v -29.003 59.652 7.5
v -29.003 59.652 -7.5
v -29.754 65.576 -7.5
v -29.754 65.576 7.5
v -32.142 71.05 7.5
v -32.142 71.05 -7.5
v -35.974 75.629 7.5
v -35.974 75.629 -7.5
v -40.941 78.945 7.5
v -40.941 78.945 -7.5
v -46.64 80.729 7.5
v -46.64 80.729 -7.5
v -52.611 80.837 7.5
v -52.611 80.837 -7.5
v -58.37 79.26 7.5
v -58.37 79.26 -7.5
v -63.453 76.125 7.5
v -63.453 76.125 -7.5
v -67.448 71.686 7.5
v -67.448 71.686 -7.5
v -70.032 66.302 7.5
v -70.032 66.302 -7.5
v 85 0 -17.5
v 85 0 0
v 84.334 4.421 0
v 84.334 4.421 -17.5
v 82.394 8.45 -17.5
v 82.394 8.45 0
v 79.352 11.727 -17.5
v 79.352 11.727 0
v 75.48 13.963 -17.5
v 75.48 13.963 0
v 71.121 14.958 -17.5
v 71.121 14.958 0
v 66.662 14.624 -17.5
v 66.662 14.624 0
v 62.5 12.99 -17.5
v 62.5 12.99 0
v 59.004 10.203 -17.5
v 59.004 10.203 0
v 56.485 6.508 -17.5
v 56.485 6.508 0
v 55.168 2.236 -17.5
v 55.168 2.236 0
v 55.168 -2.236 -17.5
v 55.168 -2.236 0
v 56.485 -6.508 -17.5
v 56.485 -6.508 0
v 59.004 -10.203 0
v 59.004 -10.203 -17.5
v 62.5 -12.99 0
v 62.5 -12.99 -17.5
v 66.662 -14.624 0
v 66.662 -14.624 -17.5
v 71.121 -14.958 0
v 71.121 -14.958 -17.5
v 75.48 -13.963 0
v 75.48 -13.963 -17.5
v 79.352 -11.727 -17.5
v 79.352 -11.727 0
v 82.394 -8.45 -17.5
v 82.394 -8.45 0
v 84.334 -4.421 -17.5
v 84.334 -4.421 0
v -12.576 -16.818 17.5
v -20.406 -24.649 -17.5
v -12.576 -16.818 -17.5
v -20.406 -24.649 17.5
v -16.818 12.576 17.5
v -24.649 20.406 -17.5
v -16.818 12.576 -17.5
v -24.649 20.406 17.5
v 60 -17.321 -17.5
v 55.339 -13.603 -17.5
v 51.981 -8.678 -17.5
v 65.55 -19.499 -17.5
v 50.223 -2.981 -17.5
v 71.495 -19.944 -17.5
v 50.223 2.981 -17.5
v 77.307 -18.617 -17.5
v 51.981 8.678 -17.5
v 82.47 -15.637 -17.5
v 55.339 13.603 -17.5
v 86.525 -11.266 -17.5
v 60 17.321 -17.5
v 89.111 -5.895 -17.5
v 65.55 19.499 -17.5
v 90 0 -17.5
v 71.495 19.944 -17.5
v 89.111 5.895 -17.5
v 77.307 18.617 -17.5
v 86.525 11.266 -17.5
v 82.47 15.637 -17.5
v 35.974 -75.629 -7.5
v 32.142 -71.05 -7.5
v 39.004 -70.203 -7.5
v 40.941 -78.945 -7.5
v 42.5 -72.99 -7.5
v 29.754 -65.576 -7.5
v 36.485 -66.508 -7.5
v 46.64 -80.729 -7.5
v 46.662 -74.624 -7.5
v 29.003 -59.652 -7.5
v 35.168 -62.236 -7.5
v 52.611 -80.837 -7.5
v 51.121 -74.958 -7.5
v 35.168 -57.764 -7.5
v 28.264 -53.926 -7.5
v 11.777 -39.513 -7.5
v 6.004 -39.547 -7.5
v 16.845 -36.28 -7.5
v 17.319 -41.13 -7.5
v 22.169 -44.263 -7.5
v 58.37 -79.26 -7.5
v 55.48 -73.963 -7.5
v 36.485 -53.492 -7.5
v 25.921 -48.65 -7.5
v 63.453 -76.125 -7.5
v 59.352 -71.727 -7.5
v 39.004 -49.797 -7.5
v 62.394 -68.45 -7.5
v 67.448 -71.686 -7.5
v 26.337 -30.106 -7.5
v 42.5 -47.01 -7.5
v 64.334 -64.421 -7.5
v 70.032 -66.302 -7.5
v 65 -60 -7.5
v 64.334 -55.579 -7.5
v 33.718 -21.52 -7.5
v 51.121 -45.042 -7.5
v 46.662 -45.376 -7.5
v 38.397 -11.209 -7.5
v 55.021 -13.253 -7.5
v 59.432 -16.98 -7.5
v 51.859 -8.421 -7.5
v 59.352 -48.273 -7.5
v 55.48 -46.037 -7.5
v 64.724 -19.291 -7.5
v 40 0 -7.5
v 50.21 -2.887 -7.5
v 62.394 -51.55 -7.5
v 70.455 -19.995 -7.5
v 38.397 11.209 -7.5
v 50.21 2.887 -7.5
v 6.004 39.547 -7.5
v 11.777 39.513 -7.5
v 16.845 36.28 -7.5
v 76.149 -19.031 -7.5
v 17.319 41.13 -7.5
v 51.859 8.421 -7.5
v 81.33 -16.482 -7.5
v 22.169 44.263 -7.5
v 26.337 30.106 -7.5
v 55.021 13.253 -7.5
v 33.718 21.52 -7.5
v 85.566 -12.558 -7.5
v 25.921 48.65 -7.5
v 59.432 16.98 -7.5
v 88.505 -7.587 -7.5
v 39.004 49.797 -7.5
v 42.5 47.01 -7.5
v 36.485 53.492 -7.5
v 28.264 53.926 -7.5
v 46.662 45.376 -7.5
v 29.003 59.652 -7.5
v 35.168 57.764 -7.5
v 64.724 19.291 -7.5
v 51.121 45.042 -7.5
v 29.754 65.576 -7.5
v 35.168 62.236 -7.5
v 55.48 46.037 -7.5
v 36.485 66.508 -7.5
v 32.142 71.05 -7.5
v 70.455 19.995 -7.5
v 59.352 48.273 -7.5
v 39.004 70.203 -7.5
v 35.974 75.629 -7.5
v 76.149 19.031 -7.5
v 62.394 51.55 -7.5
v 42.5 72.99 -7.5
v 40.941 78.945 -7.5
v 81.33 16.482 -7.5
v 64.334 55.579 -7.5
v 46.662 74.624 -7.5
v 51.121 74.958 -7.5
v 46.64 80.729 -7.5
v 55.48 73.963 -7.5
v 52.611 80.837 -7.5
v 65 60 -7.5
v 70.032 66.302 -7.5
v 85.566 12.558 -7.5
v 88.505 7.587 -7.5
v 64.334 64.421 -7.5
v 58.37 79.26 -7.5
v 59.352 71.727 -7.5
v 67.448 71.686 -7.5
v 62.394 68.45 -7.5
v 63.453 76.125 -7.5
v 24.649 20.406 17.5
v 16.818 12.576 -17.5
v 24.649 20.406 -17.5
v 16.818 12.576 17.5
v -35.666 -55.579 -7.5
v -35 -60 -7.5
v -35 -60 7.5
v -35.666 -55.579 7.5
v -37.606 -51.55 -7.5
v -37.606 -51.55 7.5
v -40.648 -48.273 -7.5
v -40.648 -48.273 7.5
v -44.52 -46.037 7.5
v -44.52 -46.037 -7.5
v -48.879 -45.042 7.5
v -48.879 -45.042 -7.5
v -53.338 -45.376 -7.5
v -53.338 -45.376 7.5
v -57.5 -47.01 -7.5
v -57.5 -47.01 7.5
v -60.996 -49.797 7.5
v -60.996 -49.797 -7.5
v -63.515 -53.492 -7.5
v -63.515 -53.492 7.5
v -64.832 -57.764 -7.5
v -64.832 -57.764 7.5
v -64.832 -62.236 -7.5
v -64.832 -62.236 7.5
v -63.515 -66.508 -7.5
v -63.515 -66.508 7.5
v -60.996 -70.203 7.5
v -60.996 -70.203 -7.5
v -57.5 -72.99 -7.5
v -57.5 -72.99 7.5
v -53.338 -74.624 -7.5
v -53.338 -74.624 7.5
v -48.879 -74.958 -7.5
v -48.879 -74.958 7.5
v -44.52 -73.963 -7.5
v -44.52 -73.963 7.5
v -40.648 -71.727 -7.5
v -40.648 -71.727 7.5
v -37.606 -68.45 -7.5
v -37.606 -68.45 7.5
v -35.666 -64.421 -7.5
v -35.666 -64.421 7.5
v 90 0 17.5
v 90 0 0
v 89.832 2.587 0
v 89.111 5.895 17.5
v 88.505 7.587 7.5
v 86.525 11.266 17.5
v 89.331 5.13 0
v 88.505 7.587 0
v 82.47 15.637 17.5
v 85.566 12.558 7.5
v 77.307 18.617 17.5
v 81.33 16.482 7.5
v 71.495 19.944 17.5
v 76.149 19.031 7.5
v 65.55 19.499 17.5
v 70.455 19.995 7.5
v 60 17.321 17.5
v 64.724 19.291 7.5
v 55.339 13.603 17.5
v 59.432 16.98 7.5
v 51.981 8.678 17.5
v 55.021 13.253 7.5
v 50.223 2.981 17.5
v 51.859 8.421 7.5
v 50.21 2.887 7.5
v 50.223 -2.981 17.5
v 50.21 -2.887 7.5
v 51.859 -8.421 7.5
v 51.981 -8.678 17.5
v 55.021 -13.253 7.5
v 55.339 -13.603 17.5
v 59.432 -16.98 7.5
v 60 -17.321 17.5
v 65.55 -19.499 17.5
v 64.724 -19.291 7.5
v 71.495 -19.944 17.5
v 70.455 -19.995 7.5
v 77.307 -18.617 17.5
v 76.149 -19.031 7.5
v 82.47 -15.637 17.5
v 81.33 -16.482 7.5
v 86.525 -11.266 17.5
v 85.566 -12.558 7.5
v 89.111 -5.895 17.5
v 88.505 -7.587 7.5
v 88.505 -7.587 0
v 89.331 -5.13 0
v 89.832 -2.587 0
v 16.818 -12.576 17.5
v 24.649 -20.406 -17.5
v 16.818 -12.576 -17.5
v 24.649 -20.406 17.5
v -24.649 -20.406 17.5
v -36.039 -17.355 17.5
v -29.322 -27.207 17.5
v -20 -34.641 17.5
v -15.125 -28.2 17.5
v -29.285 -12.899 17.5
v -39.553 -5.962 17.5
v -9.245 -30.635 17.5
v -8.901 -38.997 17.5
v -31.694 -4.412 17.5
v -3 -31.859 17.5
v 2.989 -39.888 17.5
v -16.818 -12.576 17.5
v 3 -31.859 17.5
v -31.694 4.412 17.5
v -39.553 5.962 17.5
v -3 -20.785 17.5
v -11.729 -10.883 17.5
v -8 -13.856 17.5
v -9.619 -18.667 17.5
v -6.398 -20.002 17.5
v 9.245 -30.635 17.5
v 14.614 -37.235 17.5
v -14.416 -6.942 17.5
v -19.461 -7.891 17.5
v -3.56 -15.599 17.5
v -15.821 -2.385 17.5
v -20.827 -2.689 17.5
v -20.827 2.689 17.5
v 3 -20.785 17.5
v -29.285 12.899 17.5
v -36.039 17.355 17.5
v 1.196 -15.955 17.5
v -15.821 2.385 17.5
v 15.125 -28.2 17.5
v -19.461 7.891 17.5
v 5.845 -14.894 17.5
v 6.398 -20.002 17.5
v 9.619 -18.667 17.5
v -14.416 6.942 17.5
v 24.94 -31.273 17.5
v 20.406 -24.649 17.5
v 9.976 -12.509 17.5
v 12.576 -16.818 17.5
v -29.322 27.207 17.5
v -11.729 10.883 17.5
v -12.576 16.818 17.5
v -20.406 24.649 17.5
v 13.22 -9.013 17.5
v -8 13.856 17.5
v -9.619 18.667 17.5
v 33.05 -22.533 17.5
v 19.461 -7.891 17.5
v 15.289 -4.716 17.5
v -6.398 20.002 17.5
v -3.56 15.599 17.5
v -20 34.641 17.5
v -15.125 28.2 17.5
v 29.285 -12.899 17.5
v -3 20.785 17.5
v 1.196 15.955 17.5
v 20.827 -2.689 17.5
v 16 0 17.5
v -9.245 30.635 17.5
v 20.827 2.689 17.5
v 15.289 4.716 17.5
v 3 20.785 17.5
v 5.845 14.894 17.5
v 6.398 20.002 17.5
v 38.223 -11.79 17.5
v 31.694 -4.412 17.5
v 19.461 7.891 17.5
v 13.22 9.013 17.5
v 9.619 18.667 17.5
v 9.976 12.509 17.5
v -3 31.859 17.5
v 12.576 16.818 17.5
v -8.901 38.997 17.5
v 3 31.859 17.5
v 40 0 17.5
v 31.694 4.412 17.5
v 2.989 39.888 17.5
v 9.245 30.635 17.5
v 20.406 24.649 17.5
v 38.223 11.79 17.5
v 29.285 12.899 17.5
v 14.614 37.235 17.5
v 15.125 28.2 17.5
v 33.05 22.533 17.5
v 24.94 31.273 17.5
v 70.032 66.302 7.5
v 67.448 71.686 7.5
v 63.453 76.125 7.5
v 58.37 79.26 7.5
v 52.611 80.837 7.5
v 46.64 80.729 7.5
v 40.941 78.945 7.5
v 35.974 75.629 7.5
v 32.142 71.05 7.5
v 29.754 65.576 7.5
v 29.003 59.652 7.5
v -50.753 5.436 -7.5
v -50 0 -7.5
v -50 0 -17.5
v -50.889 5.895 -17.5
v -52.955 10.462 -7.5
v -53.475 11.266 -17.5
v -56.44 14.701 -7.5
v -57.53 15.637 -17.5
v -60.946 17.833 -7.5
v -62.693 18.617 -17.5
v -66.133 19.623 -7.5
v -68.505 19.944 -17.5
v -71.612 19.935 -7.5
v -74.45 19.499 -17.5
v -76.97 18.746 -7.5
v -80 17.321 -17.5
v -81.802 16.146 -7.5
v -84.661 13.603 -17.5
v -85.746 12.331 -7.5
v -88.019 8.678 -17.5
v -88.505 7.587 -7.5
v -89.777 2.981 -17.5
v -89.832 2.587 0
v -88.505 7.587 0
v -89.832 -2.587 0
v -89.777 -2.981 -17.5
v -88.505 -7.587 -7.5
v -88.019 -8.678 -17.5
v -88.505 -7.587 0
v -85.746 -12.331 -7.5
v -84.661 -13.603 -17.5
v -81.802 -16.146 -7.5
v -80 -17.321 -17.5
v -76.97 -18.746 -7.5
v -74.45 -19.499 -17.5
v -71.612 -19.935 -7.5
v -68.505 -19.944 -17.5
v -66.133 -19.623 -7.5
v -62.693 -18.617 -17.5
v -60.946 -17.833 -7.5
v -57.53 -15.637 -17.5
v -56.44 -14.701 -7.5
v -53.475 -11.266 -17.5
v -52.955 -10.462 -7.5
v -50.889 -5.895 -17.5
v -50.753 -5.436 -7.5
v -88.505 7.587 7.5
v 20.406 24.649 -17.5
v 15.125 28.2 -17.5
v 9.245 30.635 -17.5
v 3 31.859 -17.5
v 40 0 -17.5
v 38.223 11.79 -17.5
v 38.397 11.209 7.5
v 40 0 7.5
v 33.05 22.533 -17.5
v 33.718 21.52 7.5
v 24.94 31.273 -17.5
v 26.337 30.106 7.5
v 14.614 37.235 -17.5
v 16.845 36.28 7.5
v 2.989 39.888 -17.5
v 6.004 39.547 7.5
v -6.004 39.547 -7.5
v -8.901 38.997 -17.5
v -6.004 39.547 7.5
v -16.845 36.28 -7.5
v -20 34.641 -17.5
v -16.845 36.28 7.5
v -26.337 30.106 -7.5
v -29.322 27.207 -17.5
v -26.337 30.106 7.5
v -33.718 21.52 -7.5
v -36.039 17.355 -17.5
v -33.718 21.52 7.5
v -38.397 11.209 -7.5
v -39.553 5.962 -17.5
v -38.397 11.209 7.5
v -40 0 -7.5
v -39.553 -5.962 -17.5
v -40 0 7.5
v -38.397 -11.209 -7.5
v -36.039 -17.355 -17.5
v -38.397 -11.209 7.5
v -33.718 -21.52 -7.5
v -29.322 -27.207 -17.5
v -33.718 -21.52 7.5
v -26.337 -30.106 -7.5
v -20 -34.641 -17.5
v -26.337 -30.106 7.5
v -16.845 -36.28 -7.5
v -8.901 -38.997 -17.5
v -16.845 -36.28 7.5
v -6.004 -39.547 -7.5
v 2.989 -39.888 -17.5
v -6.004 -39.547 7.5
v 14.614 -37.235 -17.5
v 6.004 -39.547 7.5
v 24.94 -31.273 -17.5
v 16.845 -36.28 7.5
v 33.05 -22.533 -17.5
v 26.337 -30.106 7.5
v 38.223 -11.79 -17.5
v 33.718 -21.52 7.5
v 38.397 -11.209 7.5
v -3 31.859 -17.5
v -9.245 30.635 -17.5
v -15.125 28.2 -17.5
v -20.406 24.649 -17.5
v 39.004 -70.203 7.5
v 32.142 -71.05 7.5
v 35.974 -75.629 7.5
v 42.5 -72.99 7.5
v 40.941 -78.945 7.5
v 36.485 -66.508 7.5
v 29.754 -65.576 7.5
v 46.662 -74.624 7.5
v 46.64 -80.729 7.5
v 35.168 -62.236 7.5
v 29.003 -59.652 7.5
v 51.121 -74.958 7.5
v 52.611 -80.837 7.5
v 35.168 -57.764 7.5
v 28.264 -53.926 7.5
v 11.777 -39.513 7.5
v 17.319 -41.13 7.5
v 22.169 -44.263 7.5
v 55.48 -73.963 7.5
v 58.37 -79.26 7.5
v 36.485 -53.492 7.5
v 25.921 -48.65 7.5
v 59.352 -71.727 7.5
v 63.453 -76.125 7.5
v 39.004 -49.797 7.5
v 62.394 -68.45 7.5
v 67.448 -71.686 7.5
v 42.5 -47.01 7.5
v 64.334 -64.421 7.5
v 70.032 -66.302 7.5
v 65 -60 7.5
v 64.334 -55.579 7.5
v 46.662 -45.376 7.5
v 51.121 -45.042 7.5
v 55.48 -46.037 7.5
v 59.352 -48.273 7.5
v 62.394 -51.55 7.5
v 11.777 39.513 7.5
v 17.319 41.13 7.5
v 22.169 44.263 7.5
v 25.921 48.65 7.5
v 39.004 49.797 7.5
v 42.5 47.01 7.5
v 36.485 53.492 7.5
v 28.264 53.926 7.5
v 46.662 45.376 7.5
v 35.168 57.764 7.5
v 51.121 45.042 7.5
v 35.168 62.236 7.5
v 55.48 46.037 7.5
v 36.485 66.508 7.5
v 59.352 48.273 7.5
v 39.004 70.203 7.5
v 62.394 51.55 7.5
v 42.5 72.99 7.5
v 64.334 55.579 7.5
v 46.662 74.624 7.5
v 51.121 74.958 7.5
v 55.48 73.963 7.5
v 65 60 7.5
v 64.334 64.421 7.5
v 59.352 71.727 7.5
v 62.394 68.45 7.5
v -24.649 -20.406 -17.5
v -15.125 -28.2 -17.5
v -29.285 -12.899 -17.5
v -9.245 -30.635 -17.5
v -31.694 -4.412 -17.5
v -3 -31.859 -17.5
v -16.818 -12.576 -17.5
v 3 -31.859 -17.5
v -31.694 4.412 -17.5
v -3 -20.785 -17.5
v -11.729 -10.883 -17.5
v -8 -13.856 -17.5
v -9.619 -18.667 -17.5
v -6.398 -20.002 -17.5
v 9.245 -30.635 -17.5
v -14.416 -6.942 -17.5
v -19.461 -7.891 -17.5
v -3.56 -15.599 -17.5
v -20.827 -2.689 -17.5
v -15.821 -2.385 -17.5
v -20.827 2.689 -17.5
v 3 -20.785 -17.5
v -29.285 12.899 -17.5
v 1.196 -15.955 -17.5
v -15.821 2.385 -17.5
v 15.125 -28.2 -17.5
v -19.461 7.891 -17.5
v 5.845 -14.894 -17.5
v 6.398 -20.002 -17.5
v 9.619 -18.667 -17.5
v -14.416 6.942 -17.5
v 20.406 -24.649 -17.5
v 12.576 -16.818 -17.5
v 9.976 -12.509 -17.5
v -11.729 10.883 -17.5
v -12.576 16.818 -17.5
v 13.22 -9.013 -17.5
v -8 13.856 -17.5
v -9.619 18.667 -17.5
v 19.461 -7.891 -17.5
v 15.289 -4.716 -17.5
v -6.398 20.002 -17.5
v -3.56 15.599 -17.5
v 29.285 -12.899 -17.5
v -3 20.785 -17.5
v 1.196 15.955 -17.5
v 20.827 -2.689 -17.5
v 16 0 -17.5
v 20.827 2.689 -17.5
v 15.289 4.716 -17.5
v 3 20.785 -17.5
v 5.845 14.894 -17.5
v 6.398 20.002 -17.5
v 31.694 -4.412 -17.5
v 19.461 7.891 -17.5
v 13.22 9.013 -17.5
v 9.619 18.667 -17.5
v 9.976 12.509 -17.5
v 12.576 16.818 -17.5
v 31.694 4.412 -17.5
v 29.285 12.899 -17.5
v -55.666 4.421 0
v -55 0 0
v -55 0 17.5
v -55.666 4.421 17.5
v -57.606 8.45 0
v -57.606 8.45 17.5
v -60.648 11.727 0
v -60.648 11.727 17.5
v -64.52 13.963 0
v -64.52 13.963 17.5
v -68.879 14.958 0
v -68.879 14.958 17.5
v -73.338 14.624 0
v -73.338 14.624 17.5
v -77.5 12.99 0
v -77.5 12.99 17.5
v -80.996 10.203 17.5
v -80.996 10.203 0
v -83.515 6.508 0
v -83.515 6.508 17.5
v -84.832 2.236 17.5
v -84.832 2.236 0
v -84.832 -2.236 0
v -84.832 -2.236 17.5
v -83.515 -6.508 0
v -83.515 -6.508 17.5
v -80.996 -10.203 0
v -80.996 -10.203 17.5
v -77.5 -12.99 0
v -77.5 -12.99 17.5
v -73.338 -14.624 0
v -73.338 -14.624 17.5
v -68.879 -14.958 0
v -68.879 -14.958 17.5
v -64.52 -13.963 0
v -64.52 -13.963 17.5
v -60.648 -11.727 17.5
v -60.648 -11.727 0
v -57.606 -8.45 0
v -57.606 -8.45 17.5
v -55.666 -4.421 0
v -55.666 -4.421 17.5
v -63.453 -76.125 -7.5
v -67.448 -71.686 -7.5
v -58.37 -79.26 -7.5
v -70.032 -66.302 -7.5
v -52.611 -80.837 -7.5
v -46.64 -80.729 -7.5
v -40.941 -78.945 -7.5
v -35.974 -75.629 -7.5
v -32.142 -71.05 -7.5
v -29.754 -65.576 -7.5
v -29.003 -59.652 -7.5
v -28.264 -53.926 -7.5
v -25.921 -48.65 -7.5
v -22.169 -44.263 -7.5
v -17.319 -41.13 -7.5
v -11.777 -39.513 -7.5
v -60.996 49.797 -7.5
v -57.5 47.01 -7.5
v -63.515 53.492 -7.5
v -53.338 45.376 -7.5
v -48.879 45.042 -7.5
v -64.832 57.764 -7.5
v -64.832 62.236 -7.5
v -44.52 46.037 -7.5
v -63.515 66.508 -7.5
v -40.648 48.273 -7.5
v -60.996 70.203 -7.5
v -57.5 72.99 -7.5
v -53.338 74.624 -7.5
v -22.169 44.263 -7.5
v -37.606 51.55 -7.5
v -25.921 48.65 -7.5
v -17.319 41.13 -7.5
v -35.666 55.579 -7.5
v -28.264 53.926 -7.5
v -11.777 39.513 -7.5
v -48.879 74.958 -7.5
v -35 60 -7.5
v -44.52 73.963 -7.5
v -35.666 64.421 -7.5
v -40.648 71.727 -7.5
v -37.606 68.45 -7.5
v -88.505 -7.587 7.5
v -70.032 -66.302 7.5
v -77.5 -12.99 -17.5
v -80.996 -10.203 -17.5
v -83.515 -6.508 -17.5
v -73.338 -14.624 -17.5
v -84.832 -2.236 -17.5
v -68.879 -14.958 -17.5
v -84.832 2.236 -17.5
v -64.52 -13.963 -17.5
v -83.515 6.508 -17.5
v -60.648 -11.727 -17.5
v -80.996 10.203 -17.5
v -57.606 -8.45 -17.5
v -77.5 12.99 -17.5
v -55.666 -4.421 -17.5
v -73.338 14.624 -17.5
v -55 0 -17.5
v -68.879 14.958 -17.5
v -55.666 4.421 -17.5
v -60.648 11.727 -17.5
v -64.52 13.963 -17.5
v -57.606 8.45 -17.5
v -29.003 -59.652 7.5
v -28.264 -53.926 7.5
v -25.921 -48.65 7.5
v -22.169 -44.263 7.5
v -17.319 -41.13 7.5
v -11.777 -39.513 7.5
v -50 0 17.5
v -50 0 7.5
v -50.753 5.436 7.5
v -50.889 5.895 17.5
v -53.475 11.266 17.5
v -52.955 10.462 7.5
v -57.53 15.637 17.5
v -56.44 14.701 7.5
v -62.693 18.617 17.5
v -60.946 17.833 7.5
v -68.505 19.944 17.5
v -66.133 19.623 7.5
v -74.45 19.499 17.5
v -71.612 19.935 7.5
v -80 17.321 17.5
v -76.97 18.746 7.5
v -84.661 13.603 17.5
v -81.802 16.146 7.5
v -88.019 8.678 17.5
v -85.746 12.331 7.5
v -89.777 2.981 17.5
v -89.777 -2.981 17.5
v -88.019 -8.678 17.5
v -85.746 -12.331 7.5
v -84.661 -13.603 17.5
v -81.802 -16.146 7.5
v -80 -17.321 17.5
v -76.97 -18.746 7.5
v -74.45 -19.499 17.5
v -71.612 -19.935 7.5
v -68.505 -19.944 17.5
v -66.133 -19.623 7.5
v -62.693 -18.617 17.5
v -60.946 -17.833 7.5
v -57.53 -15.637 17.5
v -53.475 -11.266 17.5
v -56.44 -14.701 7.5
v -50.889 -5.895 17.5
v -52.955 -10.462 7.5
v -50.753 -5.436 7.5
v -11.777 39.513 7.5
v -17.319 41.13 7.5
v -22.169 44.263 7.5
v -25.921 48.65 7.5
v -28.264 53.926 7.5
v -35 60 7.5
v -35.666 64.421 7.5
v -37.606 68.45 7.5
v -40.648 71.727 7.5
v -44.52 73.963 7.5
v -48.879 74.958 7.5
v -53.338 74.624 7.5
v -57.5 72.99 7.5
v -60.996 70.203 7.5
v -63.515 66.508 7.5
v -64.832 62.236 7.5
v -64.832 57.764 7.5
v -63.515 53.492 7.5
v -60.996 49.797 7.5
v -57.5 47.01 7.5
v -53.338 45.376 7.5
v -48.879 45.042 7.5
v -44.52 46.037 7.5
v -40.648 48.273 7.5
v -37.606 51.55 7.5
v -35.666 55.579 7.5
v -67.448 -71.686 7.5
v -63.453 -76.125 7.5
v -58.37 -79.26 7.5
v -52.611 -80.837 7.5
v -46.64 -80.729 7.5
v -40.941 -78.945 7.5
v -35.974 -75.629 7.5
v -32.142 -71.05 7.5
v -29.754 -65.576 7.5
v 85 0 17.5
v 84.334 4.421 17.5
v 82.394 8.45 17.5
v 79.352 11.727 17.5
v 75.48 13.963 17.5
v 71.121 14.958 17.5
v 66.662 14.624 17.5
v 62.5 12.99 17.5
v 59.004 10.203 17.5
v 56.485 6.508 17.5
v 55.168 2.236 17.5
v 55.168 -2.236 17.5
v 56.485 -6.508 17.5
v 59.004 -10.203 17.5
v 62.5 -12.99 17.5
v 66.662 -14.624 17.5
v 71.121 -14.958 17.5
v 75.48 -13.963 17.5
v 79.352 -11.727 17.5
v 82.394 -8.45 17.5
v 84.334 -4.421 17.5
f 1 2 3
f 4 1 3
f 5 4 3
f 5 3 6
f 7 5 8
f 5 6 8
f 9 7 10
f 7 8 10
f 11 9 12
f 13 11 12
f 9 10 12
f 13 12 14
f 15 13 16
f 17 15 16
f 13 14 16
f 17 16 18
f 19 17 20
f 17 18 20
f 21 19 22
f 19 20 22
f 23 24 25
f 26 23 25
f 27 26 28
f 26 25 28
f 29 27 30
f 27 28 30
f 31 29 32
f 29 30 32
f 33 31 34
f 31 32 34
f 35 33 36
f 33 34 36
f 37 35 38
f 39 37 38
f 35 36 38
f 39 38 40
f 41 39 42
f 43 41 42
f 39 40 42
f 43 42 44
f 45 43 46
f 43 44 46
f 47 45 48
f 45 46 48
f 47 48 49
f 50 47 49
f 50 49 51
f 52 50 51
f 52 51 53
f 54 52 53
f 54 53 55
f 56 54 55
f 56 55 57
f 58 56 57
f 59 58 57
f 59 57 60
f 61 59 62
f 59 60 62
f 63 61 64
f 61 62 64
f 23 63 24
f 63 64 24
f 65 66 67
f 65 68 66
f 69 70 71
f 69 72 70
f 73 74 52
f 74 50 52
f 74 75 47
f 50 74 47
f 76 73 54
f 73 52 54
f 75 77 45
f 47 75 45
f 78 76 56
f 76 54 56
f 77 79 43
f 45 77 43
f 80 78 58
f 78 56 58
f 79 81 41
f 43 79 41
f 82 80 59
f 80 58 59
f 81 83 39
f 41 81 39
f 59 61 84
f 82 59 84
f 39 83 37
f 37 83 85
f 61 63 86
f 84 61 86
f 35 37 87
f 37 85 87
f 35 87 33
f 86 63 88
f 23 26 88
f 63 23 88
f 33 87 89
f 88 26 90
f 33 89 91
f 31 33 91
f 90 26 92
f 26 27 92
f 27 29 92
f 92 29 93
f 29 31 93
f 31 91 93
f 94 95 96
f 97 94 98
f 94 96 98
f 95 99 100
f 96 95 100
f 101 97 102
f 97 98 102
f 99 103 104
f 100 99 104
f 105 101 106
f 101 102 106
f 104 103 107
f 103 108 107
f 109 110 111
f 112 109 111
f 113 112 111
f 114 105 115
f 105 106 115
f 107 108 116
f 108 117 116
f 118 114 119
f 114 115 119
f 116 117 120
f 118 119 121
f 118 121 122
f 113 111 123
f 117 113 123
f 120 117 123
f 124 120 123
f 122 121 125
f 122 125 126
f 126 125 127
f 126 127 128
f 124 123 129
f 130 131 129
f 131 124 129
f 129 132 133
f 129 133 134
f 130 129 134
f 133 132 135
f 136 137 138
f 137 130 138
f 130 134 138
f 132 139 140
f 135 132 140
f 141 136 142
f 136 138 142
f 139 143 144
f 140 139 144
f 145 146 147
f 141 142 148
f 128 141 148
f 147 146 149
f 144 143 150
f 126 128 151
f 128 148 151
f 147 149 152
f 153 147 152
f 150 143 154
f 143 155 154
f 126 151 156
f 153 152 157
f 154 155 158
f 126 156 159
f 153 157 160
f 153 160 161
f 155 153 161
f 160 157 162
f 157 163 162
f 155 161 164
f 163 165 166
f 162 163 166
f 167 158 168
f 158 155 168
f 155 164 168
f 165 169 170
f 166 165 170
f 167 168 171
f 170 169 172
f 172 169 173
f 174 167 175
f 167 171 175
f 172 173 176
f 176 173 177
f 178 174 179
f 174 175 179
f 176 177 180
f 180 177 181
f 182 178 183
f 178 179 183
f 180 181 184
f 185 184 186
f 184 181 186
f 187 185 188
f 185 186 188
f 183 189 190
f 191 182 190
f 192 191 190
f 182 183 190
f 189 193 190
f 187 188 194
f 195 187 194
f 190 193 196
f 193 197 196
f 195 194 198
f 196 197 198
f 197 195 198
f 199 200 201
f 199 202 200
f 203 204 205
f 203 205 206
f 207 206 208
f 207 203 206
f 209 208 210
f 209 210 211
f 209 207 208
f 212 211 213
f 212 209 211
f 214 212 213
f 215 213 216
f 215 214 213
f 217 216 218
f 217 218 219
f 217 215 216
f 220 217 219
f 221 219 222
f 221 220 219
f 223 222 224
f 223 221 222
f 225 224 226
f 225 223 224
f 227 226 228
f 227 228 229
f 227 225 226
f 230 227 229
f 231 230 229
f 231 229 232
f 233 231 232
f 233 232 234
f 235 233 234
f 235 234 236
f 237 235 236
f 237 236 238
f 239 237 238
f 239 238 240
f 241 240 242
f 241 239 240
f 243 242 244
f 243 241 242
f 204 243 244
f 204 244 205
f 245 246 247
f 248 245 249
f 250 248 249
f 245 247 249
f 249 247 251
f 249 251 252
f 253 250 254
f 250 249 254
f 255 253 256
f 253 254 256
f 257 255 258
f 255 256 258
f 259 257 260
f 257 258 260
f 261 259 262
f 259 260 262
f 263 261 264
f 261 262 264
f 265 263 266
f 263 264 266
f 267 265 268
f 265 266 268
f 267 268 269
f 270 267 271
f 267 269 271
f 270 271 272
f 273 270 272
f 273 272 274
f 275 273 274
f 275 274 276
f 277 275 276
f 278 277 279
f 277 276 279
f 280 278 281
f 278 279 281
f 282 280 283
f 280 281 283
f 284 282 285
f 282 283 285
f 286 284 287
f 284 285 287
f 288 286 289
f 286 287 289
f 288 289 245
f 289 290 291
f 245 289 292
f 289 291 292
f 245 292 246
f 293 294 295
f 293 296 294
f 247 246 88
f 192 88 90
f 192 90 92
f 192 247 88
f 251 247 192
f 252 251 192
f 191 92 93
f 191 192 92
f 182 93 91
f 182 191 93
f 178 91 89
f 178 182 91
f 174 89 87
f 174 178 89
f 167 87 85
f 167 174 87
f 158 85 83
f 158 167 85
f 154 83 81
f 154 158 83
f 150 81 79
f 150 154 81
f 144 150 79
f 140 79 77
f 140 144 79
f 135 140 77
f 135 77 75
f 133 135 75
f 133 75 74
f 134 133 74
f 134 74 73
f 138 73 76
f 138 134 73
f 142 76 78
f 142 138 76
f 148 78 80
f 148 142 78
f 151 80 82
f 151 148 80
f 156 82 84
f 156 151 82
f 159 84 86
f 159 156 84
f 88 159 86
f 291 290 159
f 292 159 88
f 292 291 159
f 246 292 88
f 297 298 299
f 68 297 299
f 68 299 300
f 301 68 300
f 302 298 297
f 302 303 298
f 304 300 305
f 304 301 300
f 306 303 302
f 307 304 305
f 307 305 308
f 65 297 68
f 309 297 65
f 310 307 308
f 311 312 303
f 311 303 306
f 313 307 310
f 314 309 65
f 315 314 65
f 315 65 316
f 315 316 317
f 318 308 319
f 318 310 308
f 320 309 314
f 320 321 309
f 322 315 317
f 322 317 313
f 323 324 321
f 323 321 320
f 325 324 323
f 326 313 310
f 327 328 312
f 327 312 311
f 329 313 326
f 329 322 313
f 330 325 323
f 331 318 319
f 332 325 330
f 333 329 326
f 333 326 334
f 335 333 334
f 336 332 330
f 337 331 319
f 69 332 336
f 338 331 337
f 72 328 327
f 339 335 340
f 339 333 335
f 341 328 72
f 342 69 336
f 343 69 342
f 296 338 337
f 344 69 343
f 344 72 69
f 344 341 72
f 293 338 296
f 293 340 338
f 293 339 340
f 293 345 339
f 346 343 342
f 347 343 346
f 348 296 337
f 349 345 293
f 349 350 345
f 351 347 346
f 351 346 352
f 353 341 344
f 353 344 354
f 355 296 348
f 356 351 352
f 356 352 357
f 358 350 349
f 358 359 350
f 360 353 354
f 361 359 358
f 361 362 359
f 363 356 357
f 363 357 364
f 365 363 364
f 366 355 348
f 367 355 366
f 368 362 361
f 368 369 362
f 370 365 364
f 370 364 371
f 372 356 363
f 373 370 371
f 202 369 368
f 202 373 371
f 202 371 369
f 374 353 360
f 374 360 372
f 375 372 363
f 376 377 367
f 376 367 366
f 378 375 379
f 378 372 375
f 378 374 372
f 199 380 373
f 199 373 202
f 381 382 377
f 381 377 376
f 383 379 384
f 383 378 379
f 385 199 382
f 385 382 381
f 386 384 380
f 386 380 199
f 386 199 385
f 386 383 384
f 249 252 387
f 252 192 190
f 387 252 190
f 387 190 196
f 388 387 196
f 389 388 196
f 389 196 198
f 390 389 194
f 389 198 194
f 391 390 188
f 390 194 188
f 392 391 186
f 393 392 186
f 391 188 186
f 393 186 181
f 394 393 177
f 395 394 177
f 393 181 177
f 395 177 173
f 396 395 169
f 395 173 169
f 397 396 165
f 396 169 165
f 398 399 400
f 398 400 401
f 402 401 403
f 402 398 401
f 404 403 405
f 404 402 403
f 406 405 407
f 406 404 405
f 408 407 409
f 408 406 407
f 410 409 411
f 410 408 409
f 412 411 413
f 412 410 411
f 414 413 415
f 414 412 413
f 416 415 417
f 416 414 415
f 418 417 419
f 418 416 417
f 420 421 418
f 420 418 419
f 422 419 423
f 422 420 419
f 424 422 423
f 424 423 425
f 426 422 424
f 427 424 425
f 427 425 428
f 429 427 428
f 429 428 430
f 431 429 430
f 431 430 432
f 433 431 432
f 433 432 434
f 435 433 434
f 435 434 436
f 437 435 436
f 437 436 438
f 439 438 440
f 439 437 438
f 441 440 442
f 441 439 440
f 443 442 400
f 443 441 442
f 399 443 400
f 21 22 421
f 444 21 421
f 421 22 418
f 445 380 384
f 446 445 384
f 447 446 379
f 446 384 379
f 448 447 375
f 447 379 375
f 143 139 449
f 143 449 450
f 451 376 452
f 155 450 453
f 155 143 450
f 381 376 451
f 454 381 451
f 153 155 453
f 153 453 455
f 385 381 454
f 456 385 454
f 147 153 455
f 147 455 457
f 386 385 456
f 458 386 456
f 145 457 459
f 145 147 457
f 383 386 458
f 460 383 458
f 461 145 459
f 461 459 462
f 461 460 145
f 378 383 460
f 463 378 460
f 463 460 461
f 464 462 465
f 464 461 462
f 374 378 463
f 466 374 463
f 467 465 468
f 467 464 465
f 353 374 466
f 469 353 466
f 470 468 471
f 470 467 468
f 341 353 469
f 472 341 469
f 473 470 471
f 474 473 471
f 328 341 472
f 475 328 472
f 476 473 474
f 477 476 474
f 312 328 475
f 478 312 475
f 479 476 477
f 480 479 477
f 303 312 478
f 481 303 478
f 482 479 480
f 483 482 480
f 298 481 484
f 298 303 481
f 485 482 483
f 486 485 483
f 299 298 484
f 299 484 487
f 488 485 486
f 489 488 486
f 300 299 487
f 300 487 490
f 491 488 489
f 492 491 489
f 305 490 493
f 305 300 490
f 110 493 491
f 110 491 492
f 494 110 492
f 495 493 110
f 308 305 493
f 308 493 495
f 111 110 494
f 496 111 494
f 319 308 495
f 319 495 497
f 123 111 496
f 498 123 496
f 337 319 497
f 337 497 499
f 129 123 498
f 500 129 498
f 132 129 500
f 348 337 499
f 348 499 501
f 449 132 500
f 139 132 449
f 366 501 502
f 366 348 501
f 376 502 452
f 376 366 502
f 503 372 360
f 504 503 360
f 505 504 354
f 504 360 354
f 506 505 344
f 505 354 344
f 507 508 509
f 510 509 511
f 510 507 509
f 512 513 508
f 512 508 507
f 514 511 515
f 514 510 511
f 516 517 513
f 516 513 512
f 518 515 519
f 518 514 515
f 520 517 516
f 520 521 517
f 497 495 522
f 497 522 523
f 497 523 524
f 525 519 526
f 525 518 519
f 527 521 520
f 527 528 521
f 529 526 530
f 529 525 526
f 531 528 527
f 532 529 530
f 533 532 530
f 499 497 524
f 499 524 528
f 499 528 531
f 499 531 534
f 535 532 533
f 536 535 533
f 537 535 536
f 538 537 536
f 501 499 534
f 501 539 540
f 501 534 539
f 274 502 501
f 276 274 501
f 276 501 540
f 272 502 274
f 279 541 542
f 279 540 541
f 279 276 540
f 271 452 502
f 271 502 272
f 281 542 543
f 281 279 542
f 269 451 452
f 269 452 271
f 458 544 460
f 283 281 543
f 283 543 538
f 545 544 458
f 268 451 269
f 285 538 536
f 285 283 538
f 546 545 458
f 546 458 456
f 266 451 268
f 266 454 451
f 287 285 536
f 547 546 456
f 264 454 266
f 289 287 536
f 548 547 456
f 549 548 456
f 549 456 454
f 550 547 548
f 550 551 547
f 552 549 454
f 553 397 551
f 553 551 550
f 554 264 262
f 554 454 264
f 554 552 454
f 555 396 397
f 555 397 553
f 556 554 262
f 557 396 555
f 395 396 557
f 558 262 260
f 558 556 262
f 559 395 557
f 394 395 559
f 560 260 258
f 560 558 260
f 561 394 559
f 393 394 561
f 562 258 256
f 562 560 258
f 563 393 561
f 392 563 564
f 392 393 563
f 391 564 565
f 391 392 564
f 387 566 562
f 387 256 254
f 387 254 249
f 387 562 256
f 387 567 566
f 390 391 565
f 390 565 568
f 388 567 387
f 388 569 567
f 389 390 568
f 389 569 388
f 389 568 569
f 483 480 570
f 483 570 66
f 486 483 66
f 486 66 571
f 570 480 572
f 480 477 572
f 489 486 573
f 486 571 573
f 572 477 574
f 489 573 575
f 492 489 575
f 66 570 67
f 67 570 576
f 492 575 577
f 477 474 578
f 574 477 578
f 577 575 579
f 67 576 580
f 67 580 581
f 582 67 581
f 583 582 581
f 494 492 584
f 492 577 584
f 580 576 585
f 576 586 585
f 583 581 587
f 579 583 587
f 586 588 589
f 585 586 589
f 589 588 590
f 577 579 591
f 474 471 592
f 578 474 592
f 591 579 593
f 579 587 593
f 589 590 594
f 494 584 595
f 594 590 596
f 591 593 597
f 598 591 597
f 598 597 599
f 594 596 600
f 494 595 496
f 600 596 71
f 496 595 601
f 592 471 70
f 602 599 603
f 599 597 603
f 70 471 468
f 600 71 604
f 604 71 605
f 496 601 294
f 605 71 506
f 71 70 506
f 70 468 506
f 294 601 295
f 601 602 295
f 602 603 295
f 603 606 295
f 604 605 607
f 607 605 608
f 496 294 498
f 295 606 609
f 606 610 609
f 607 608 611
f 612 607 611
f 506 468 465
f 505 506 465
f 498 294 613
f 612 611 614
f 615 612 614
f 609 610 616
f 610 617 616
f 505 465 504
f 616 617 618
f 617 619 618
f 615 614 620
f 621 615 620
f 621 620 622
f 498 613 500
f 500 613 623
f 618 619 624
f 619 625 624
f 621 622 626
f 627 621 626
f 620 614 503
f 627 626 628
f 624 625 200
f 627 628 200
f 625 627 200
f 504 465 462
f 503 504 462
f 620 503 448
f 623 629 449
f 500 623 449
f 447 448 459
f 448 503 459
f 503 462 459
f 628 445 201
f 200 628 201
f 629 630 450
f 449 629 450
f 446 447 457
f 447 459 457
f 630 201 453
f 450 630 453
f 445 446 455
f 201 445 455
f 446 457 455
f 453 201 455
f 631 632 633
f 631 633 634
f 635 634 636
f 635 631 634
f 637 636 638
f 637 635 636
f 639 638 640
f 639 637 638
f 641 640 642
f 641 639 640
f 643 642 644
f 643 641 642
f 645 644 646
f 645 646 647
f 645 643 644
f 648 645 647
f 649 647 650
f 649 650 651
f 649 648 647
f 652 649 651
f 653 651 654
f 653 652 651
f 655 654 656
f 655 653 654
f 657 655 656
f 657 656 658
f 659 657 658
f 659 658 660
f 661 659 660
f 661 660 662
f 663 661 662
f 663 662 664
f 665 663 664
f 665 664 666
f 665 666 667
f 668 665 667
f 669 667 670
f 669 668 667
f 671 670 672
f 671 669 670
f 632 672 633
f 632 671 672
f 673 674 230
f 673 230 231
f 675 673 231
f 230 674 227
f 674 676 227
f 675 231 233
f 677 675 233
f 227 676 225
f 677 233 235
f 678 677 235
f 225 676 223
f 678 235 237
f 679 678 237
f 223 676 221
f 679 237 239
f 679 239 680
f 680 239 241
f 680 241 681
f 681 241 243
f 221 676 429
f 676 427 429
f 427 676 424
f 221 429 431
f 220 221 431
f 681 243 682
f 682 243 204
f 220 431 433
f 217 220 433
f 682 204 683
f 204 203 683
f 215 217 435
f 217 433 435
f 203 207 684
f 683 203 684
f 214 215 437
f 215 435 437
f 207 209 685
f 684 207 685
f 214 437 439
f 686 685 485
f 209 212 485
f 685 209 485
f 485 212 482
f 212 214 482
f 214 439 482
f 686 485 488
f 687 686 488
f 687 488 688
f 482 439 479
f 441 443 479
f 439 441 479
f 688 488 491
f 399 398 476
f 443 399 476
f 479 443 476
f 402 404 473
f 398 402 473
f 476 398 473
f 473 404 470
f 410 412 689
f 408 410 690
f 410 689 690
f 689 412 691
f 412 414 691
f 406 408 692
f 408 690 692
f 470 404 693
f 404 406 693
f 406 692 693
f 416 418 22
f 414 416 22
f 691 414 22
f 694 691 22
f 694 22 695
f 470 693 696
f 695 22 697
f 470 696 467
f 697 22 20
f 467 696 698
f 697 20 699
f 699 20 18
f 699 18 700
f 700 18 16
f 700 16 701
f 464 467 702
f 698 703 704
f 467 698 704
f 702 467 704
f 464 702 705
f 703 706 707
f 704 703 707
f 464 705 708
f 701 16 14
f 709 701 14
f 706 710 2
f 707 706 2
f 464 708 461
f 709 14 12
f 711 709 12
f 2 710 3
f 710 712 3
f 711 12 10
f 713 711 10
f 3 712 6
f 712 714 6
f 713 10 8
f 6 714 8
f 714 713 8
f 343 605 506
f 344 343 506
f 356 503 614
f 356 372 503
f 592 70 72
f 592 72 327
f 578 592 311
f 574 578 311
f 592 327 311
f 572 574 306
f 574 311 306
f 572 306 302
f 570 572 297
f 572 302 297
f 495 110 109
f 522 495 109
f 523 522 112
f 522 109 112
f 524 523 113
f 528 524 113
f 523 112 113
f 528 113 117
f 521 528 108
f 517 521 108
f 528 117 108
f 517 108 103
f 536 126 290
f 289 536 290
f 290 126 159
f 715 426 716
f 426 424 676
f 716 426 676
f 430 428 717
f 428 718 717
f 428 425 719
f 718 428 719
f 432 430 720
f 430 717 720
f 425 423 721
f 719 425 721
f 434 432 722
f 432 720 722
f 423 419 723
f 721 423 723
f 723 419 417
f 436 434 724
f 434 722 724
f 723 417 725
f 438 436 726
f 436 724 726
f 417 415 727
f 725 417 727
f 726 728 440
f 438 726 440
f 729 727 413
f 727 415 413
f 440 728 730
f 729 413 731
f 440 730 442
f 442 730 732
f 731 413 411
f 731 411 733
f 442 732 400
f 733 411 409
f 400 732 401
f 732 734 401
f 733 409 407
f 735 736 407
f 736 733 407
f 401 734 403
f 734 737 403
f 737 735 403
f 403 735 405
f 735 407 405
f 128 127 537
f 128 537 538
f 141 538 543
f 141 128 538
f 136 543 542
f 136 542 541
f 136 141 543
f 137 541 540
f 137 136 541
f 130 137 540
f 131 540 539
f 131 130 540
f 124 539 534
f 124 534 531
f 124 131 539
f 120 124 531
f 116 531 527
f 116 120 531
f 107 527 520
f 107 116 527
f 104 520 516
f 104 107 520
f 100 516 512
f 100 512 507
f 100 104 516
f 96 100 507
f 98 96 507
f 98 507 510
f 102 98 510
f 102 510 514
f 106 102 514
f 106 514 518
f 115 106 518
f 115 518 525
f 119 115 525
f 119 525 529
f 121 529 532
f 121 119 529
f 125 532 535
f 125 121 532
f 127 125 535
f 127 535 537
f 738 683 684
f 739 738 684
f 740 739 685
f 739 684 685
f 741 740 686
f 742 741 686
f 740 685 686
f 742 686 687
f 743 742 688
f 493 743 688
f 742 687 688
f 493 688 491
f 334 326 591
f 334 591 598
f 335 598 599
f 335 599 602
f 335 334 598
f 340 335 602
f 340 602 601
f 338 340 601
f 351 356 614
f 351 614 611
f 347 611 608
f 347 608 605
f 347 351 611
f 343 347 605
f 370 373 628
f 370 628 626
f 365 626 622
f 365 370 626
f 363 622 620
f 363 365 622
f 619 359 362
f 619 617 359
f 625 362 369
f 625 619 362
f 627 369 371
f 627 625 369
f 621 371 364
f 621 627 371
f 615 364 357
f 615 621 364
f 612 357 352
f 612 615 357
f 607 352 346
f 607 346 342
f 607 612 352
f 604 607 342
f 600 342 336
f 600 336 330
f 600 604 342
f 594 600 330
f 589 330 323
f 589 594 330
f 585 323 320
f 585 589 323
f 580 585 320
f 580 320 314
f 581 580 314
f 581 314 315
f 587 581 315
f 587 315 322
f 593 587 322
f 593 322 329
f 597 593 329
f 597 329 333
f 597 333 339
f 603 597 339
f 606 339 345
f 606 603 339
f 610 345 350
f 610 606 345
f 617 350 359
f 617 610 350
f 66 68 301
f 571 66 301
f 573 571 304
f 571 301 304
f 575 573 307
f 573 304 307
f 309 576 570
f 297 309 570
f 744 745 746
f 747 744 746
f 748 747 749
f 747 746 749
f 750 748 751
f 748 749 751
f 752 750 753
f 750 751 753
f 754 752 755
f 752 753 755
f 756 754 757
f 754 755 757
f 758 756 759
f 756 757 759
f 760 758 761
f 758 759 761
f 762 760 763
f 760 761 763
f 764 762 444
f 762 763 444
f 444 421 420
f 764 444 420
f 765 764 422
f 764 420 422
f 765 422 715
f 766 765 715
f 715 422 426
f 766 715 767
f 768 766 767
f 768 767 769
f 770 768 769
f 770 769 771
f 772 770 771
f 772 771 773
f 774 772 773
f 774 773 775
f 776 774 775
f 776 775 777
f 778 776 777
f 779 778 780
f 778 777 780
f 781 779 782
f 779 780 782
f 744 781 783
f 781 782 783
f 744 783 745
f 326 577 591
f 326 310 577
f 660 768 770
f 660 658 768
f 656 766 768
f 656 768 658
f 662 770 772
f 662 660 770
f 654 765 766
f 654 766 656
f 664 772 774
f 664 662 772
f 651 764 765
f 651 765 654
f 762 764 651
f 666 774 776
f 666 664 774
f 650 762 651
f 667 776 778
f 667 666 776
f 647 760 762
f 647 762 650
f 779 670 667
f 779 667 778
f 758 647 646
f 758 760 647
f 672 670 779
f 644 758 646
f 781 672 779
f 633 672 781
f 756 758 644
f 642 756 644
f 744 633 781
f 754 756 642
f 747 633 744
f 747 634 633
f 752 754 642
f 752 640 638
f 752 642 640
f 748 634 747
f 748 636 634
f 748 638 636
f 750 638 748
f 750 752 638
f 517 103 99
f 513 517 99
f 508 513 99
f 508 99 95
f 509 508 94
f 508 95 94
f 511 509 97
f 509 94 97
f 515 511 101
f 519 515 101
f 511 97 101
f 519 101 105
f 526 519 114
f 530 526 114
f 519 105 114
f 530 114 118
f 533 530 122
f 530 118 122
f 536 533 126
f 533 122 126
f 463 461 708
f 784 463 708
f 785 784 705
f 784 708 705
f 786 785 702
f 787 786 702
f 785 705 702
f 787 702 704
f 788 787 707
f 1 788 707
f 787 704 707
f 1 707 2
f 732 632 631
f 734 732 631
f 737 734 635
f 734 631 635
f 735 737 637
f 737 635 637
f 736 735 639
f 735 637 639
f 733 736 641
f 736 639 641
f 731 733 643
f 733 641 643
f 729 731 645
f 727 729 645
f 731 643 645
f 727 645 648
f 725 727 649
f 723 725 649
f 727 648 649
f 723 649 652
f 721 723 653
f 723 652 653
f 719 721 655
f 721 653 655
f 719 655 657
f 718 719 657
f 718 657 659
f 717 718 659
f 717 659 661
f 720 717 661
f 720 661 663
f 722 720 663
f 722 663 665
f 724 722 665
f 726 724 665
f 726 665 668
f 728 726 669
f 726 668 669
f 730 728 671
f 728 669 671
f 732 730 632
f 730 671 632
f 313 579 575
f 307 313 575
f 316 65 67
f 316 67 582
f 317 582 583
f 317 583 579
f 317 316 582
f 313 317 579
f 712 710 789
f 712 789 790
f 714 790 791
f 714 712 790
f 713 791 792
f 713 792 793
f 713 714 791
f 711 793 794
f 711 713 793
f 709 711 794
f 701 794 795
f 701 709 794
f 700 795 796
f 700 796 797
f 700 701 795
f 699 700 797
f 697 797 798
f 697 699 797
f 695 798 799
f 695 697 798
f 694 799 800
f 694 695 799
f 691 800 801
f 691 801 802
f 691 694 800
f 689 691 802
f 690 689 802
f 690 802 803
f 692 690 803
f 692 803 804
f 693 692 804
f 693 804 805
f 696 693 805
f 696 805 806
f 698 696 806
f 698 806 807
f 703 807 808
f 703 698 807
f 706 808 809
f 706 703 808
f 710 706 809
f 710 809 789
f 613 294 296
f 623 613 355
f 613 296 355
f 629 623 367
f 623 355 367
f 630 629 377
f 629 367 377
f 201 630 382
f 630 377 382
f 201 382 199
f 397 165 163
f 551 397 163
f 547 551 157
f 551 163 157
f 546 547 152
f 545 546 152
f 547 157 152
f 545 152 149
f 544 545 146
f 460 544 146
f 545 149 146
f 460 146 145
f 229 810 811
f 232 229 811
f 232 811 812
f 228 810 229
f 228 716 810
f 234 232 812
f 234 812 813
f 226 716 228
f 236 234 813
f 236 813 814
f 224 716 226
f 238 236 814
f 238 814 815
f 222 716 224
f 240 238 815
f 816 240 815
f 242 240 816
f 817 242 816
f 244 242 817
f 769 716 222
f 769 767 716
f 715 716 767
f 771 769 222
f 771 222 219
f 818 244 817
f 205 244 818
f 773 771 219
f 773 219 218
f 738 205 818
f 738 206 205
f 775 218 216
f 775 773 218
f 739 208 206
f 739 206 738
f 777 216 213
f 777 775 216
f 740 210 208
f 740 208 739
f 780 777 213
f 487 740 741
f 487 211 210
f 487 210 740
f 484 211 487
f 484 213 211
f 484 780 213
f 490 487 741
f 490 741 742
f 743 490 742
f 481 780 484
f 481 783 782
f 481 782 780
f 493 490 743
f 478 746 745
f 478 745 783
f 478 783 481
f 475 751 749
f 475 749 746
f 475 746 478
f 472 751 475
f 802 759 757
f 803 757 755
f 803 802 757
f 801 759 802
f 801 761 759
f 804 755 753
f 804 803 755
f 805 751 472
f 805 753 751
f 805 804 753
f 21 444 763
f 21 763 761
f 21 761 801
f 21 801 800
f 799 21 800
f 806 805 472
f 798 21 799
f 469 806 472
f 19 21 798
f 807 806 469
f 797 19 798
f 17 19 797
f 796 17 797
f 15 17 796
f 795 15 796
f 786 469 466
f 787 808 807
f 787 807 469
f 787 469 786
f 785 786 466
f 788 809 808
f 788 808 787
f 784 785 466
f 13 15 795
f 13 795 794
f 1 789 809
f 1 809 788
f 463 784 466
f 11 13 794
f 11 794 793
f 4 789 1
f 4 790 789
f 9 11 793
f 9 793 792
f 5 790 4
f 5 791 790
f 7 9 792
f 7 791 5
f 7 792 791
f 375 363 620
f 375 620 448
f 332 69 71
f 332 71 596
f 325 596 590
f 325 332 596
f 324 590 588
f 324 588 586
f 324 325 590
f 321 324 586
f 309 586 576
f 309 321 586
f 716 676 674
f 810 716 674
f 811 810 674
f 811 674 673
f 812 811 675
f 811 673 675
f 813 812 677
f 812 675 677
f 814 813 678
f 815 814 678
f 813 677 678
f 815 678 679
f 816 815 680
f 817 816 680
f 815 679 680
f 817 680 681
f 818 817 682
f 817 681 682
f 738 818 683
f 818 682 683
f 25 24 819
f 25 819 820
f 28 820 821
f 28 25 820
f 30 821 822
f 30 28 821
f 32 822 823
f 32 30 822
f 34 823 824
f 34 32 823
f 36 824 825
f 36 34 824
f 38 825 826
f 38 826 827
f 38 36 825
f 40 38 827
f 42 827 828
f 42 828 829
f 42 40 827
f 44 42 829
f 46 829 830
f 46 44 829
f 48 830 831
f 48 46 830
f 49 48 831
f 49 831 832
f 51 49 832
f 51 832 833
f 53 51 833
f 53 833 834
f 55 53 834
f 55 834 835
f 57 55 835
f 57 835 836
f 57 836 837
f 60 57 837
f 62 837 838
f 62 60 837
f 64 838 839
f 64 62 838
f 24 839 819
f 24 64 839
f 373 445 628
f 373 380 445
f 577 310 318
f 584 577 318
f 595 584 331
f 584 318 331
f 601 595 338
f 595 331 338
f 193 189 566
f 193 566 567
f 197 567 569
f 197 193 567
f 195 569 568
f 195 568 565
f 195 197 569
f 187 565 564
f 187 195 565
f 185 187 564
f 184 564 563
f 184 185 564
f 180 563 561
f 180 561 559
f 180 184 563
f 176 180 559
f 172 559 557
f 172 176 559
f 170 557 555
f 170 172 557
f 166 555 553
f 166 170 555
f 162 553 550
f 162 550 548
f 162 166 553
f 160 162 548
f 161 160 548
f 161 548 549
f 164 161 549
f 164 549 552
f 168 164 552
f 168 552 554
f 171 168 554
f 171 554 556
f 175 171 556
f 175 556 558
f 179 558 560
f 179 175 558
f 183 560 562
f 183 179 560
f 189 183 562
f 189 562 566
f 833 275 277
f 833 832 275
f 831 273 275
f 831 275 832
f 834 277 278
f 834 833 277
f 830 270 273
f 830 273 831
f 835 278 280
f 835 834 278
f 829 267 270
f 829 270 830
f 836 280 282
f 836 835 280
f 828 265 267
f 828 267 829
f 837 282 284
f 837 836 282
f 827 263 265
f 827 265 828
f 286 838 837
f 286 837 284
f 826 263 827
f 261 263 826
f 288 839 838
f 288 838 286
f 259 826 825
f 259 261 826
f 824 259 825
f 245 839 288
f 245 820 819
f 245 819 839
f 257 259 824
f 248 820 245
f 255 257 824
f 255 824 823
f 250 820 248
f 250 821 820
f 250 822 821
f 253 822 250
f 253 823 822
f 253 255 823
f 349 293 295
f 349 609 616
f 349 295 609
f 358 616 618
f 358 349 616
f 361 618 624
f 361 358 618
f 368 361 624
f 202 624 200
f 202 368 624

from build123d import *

# Parameters (mm, degrees)
SKETCH1_R           = 20
SKETCH1_R_2         = 15
SKETCH1_R_3         = 40
SKETCH1_R_4         = 32
SKETCH1_R_5         = 21
SKETCH1_R_6         = 16
BOSS_EXTRUDE1_DEPTH = 17.5
BOSS_EXTRUDE2_START = -7.5
SKETCH1_5_R         = 15
BOSS_EXTRUDE2_DEPTH = 15


with BuildPart() as part:
    # Sketch1 → Boss-Extrude1 (new, symmetric)
    # profile 1 of 10: a face of its own
    with BuildSketch(Plane.XY):
        with Locations((-70, 0)):
            Circle(SKETCH1_R)
        with Locations((-70, 0)):
            Circle(SKETCH1_R_2, mode=Mode.SUBTRACT)
    # profile 2 of 10: a face of its own
    with BuildSketch(Plane.XY):
        with Locations((70, 0)):
            Circle(SKETCH1_R)
        with Locations((70, 0)):
            Circle(SKETCH1_R_2, mode=Mode.SUBTRACT)
    # profile 3 of 10: a face of its own
    with BuildSketch(Plane.XY):
        Circle(SKETCH1_R_3)
        Circle(SKETCH1_R_4, mode=Mode.SUBTRACT)
    # profile 4 of 10: a face of its own
    with BuildSketch(Plane.XY):
        Circle(SKETCH1_R_5)
        Circle(SKETCH1_R_6, mode=Mode.SUBTRACT)
    # profile 5 of 10: a face of its own
    with BuildSketch(Plane.XY):
        with BuildLine():
            ThreePointArc((20.406440309, -24.649080996), (22.627416998, -22.627416998), (24.649080996, -20.406440309))
            Line((24.649080996, -20.406440309), (16.8182588, -12.575618113))
            ThreePointArc((16.8182588, -12.575618113), (14.849242405, -14.849242405), (12.575618113, -16.8182588))
            Line((12.575618113, -16.8182588), (20.406440309, -24.649080996))
        make_face()
    # profile 6 of 10: a face of its own
    with BuildSketch(Plane.XY):
        with BuildLine():
            ThreePointArc((-3, -31.859064644), (0, -32), (3, -31.859064644))
            Line((3, -31.859064644), (3, -20.784609691))
            ThreePointArc((3, -20.784609691), (0, -21), (-3, -20.784609691))
            Line((-3, -20.784609691), (-3, -31.859064644))
        make_face()
    # profile 7 of 10: a face of its own
    with BuildSketch(Plane.XY):
        with BuildLine():
            Line((-16.8182588, -12.575618113), (-24.649080996, -20.406440309))
            ThreePointArc((-24.649080996, -20.406440309), (-22.627416998, -22.627416998), (-20.406440309, -24.649080996))
            Line((-20.406440309, -24.649080996), (-12.575618113, -16.8182588))
            ThreePointArc((-12.575618113, -16.8182588), (-14.849242405, -14.849242405), (-16.8182588, -12.575618113))
        make_face()
    # profile 8 of 10: a face of its own
    with BuildSketch(Plane.XY):
        with BuildLine():
            Line((-12.575618113, 16.8182588), (-20.406440309, 24.649080996))
            ThreePointArc((-20.406440309, 24.649080996), (-22.627416998, 22.627416998), (-24.649080996, 20.406440309))
            Line((-24.649080996, 20.406440309), (-16.8182588, 12.575618113))
            ThreePointArc((-16.8182588, 12.575618113), (-14.849242405, 14.849242405), (-12.575618113, 16.8182588))
        make_face()
    # profile 9 of 10: a face of its own
    with BuildSketch(Plane.XY):
        with BuildLine():
            Line((3, 20.784609691), (3, 31.859064644))
            ThreePointArc((3, 31.859064644), (0, 32), (-3, 31.859064644))
            Line((-3, 31.859064644), (-3, 20.784609691))
            ThreePointArc((-3, 20.784609691), (0, 21), (3, 20.784609691))
        make_face()
    # profile 10 of 10: a face of its own
    with BuildSketch(Plane.XY):
        with BuildLine():
            ThreePointArc((24.649080996, 20.406440309), (22.627416998, 22.627416998), (20.406440309, 24.649080996))
            Line((20.406440309, 24.649080996), (12.575618113, 16.8182588))
            ThreePointArc((12.575618113, 16.8182588), (14.849242405, 14.849242405), (16.8182588, 12.575618113))
            Line((16.8182588, 12.575618113), (24.649080996, 20.406440309))
        make_face()
    extrude(amount=BOSS_EXTRUDE1_DEPTH, both=True)

    # Sketch1<5> → Boss-Extrude2 (add)
    # profile 1 of 2: a face of its own
    with BuildSketch(Plane.XY.offset(BOSS_EXTRUDE2_START)):
        with BuildLine():
            ThreePointArc((-29.002885891, -59.651863383), (-22.168588856, -44.262528341), (-6.003756239, -39.546869801))
            ThreePointArc((-6.003756239, -39.546869801), (-40, 0), (-6.003756239, 39.546869801))
            ThreePointArc((-6.003756239, 39.546869801), (-22.168588856, 44.262528341), (-29.002885891, 59.651863383))
            ThreePointArc((-29.002885891, 59.651863383), (-46.639863286, 80.729435141), (-70.031947242, 66.302466954))
            Line((-70.031947242, 66.302466954), (-88.505015581, 7.587120556))
            ThreePointArc((-88.505015581, 7.587120556), (-66.133497163, 19.622694917), (-50, 0))
            ThreePointArc((-50, 0), (-66.133497163, -19.622694917), (-88.505015581, -7.587120556))
            Line((-88.505015581, -7.587120556), (-70.031947242, -66.302466954))
            ThreePointArc((-70.031947242, -66.302466954), (-46.639863286, -80.729435141), (-29.002885891, -59.651863383))
        make_face()
        with Locations((-50, -60)):
            Circle(SKETCH1_5_R, mode=Mode.SUBTRACT)
        with Locations((-50, 60)):
            Circle(SKETCH1_5_R, mode=Mode.SUBTRACT)
    # profile 2 of 2: a face of its own
    with BuildSketch(Plane.XY.offset(BOSS_EXTRUDE2_START)):
        with BuildLine():
            ThreePointArc((29.002885891, -59.651863383), (46.639863286, -80.729435141), (70.031947242, -66.302466954))
            Line((70.031947242, -66.302466954), (88.505015581, -7.587120556))
            ThreePointArc((88.505015581, -7.587120556), (50, 0), (88.505015581, 7.587120556))
            Line((88.505015581, 7.587120556), (70.031947242, 66.302466954))
            ThreePointArc((70.031947242, 66.302466954), (46.639863286, 80.729435141), (29.002885891, 59.651863383))
            ThreePointArc((29.002885891, 59.651863383), (22.168588856, 44.262528341), (6.003756239, 39.546869801))
            ThreePointArc((6.003756239, 39.546869801), (30.332740146, 26.075369129), (40, 0))
            ThreePointArc((40, 0), (30.332740146, -26.075369129), (6.003756239, -39.546869801))
            ThreePointArc((6.003756239, -39.546869801), (22.168588856, -44.262528341), (29.002885891, -59.651863383))
        make_face()
        with Locations((50, -60)):
            Circle(SKETCH1_5_R, mode=Mode.SUBTRACT)
        with Locations((50, 60)):
            Circle(SKETCH1_5_R, mode=Mode.SUBTRACT)
    extrude(amount=BOSS_EXTRUDE2_DEPTH)


solid = part.part
